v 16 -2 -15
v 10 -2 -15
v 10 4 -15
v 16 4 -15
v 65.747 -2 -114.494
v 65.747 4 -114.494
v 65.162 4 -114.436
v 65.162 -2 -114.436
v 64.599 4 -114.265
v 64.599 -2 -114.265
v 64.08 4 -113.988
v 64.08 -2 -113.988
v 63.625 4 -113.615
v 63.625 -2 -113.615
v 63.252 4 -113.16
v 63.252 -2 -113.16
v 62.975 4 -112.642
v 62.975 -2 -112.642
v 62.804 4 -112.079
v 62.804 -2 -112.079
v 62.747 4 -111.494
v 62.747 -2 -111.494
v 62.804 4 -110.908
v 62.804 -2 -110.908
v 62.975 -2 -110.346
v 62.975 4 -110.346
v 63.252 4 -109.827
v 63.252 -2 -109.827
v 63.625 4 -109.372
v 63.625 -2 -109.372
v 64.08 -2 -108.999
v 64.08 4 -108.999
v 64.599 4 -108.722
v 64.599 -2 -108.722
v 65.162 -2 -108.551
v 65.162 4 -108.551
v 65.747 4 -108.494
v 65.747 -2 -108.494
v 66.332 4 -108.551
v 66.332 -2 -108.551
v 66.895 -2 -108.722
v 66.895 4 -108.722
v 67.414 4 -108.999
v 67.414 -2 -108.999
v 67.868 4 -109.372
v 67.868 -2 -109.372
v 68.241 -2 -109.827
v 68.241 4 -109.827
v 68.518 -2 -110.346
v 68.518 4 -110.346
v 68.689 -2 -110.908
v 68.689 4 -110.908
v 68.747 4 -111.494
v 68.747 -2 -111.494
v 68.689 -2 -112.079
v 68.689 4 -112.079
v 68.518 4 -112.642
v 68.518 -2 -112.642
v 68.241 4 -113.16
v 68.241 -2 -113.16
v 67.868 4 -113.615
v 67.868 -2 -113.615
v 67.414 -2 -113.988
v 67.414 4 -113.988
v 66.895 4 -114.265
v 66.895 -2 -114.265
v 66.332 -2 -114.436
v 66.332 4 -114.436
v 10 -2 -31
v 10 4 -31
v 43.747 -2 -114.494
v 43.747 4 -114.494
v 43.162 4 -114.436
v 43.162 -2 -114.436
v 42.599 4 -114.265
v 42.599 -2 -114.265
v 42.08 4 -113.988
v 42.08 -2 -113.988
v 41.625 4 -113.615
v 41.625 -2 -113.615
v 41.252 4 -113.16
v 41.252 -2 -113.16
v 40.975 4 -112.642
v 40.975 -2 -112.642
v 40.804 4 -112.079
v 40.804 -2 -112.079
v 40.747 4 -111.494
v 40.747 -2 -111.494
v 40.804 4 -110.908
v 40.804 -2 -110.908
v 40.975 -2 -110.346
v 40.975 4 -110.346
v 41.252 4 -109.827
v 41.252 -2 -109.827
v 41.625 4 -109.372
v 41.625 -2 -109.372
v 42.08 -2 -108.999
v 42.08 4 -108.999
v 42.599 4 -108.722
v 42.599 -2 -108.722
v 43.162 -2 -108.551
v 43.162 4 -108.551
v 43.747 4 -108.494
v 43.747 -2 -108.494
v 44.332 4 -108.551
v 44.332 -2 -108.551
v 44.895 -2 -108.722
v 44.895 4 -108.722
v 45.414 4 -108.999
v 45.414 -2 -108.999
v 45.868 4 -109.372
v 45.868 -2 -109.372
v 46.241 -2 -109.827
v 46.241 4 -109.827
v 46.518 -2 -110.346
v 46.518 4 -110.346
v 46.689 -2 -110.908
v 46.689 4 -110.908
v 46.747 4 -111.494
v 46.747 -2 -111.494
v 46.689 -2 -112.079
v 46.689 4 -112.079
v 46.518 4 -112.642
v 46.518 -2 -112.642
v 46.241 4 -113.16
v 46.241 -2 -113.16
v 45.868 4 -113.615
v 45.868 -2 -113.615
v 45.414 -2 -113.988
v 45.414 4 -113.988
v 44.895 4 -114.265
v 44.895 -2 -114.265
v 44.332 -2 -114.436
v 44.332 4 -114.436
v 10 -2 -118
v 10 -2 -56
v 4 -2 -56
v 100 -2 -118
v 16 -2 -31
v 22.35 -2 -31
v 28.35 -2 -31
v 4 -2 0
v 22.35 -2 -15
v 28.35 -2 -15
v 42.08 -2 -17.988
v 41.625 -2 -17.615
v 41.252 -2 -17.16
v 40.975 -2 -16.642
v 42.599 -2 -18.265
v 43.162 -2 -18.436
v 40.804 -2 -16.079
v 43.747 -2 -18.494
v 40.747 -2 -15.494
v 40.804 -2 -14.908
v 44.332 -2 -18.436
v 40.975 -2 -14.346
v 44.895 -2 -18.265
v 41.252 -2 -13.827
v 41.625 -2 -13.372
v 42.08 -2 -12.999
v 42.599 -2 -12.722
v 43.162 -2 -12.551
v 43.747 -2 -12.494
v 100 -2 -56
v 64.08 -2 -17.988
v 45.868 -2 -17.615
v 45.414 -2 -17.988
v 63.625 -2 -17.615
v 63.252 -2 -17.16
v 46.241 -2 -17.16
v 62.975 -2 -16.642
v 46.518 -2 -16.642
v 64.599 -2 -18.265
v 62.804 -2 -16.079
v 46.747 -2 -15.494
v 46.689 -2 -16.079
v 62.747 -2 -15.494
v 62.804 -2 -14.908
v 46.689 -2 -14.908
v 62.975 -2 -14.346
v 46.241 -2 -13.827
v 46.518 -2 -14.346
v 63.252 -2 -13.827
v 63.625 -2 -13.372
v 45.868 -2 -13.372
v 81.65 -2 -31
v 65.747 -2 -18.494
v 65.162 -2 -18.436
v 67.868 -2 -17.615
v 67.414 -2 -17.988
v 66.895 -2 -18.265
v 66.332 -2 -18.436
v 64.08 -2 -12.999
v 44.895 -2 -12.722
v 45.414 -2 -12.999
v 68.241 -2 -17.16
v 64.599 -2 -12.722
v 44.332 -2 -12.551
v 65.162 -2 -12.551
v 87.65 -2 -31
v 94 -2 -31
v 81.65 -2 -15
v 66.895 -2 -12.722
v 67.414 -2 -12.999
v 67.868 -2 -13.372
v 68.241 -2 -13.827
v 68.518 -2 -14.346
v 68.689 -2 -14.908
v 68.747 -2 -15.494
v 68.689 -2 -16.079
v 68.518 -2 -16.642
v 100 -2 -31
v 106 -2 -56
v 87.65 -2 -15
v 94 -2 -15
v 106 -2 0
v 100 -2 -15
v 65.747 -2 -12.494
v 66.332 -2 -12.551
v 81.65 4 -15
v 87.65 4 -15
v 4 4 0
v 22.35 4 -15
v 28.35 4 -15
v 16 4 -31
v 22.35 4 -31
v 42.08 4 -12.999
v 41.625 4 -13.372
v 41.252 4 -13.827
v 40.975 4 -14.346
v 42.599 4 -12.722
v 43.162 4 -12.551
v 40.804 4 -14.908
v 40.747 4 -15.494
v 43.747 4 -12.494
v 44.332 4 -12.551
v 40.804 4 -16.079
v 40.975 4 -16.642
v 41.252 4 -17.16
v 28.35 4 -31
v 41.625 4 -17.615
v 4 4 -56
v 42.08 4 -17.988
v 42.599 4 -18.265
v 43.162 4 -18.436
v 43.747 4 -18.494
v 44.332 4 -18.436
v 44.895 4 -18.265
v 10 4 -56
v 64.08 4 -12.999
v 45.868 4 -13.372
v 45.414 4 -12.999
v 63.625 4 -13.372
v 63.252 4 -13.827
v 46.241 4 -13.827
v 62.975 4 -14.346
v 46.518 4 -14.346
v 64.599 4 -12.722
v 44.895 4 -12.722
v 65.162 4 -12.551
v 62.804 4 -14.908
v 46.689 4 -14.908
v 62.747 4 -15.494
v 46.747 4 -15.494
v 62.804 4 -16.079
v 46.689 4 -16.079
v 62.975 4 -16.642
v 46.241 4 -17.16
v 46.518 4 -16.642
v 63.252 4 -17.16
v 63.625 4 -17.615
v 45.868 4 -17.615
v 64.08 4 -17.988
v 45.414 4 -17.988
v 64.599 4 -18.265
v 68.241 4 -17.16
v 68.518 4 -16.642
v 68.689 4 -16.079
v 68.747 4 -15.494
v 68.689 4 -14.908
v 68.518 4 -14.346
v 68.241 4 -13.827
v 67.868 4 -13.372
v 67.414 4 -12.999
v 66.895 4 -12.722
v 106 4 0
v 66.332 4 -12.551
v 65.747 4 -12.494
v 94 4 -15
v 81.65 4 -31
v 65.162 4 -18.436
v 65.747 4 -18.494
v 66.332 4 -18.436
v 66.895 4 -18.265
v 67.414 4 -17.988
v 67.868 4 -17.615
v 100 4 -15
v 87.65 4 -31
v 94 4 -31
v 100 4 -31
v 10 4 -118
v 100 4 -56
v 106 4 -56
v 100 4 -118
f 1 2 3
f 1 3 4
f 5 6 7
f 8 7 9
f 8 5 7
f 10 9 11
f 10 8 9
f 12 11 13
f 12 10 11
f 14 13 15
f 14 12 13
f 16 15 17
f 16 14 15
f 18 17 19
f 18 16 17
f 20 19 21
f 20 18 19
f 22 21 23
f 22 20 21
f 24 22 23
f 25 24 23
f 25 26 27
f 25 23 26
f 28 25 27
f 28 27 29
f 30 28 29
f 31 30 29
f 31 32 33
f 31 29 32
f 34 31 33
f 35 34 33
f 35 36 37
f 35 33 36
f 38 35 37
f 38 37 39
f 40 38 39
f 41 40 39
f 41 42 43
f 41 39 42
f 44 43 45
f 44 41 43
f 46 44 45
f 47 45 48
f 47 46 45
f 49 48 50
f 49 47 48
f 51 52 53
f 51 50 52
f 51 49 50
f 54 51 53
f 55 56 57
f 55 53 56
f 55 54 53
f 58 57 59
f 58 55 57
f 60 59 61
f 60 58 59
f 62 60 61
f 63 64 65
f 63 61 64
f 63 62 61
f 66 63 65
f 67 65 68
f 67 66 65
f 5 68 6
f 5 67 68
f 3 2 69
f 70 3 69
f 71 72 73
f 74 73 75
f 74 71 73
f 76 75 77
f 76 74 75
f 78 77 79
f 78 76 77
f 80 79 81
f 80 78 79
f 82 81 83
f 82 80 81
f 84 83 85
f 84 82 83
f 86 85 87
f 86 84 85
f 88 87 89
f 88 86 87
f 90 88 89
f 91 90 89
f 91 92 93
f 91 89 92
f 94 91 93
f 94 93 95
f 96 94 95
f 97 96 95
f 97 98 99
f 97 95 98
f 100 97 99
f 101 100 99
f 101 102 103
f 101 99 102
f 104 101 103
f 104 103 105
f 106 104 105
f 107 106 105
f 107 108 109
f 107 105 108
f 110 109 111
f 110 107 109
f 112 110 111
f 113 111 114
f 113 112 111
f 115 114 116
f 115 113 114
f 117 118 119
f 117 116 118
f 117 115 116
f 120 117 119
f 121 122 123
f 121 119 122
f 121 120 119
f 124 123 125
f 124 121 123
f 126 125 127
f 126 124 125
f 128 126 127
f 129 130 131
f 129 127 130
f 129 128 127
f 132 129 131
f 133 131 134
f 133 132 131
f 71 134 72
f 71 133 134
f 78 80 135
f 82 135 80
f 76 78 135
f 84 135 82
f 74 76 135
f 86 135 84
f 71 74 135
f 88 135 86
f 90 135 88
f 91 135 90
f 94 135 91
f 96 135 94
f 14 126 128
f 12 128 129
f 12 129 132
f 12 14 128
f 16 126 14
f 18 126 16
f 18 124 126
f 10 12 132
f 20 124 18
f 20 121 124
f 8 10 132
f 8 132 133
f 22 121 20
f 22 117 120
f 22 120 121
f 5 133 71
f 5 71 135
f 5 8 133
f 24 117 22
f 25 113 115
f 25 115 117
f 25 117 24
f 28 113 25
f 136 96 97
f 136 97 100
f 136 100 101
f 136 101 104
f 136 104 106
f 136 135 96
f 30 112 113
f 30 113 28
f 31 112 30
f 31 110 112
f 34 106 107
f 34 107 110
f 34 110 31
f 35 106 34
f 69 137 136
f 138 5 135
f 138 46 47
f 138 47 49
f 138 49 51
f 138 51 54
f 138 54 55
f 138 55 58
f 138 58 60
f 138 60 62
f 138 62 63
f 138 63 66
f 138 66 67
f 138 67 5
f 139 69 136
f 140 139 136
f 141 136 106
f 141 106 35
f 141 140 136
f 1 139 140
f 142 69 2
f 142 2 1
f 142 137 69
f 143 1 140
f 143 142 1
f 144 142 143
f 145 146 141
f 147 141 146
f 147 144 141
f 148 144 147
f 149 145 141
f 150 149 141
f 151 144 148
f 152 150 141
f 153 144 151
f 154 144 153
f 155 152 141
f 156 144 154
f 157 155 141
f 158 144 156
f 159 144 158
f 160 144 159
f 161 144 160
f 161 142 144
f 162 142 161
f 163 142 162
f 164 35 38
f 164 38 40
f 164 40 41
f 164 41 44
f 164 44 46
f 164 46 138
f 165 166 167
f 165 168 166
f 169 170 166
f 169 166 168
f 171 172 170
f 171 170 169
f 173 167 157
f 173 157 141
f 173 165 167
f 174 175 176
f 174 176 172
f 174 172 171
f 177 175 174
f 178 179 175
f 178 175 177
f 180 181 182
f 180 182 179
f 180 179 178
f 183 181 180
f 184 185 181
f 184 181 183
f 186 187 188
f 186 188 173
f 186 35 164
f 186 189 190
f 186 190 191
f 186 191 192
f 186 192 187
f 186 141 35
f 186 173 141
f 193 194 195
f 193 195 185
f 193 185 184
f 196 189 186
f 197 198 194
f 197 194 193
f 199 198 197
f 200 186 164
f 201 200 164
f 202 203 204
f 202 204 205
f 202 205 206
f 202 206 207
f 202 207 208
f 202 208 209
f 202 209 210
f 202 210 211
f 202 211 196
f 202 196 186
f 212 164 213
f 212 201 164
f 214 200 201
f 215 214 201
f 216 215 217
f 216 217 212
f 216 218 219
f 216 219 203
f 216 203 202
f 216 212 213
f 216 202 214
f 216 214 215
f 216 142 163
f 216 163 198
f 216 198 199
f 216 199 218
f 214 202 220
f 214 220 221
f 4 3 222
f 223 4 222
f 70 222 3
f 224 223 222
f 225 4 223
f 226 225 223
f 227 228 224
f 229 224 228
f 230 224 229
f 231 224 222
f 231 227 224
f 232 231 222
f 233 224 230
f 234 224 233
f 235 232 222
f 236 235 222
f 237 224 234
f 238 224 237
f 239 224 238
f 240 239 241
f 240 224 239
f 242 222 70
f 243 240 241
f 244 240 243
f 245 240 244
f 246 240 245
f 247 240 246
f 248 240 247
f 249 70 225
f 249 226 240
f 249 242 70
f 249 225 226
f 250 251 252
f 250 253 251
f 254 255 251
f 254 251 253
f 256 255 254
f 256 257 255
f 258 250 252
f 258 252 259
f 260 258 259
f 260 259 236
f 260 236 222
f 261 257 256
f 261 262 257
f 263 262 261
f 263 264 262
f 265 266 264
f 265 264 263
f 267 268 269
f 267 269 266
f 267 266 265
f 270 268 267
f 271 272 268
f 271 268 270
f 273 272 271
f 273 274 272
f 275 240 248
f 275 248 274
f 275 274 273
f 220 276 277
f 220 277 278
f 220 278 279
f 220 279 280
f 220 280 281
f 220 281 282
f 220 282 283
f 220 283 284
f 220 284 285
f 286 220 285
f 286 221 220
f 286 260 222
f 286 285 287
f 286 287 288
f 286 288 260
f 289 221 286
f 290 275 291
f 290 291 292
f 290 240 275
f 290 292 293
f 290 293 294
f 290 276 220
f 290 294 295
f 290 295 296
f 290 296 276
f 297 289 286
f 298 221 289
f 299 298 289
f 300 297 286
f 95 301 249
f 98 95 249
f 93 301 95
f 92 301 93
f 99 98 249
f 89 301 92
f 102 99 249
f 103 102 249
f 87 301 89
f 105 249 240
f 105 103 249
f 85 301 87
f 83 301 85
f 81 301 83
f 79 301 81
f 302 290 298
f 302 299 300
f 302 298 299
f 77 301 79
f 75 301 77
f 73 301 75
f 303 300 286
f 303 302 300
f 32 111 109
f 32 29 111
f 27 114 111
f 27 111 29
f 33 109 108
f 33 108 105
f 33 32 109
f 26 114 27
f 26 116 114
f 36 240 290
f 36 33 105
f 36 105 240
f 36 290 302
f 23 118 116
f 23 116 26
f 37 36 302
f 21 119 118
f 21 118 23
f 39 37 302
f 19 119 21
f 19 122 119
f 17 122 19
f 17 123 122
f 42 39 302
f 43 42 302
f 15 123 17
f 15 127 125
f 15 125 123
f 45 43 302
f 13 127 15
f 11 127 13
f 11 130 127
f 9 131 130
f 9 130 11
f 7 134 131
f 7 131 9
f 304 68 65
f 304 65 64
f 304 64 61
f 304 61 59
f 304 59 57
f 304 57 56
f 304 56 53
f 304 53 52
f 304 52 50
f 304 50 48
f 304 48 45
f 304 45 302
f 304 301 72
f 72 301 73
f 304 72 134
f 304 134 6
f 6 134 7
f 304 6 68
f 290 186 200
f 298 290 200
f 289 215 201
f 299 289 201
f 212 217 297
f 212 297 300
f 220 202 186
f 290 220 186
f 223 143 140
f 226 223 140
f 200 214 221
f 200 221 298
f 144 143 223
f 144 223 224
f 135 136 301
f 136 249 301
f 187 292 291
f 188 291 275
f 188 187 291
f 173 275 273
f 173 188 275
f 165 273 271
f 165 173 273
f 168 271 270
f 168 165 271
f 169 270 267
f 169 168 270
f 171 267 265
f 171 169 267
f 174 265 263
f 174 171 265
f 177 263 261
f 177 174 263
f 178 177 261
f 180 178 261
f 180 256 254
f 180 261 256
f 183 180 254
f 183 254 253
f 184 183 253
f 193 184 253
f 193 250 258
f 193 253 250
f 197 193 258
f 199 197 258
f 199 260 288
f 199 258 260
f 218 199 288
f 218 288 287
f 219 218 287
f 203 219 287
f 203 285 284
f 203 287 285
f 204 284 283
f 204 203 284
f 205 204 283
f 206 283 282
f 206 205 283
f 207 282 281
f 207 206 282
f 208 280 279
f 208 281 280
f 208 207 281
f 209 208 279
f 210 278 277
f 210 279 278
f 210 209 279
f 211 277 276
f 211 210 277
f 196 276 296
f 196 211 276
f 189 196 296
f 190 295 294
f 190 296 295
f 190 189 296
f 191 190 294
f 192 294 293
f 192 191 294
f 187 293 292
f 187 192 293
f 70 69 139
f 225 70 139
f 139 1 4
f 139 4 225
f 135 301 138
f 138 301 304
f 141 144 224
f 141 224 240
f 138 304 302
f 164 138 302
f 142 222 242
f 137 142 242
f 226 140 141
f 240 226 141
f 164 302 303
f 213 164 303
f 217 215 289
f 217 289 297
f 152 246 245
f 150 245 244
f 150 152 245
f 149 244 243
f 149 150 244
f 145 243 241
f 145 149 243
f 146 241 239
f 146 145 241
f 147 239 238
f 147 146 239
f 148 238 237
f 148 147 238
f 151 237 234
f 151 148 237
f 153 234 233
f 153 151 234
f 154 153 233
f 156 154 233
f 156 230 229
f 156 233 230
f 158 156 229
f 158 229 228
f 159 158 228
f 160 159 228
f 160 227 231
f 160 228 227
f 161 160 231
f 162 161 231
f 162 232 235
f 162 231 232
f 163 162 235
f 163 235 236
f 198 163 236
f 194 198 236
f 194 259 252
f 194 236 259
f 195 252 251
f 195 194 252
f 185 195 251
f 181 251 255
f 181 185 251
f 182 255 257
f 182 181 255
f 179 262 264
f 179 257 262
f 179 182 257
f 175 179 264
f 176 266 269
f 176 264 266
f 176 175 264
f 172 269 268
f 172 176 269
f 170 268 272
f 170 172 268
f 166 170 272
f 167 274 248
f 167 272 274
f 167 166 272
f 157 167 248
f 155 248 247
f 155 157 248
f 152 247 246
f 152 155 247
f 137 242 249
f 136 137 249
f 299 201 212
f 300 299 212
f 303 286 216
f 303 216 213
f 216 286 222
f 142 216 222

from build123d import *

# Parameters (mm, degrees)
SKETCH2_W           = 110
SKETCH2_H           = 118
BOSS_EXTRUDE1_DEPTH = 4
SKETCH3_W           = 10
SKETCH3_H           = 62
BOSS_EXTRUDE2_DEPTH = 16
CUT_EXTRUDE8_DEPTH  = 163.55460621
SKETCH12_W          = 6
SKETCH12_H          = 16
BOSS_EXTRUDE3_DEPTH = 16
SKETCH14_R          = 4
CUT_EXTRUDE9_DEPTH  = 156.961533719
CUT_EXTRUDE10_DEPTH = 3.5
SKETCH24_R          = 3
CUT_EXTRUDE15_DEPTH = 8
SPLIT2_OUTLINE_W    = 16
SPLIT2_OUTLINE_H    = 62
SPLIT2_DEPTH        = 110
SPLIT3_START        = 10
SPLIT3_OUTLINE_W    = 16
SPLIT3_OUTLINE_H    = 16
SPLIT3_OUTLINE_R    = 4
SPLIT3_DEPTH        = 90
SKETCH25_W          = 10
SKETCH25_H          = 62
SKETCH25_W_2        = 6
SKETCH25_H_2        = 16
CUT_EXTRUDE16_DEPTH = 10
SKETCH27_R          = 3.395097118
SKETCH27_R_2        = 3.39905673
BOSS_EXTRUDE4_DEPTH = 4
BOSS_EXTRUDE5_DEPTH = 2
CUT_EXTRUDE18_START = -6
SKETCH29_R          = 3
SKETCH29_W          = 6
SKETCH29_H          = 16
CUT_EXTRUDE18_DEPTH = 6
SKETCH30_W          = 4
SKETCH30_H          = 56
CUT_EXTRUDE19_DEPTH = 10


# Read off the part's stored shape, not the designer's step: Split2, Split3
with BuildPart() as part:
    # Sketch2 → Boss-Extrude1 (new body)
    with BuildSketch(Plane(origin=(0, 0, 0), x_dir=(1, 0, 0), z_dir=(0, 1, 0))):
        with Locations((55, 59)):
            Rectangle(SKETCH2_W, SKETCH2_H)
    extrude(amount=BOSS_EXTRUDE1_DEPTH)

    # Sketch3 → Boss-Extrude2 (add)
    with BuildSketch(Plane(origin=(0, 4, 0), x_dir=(1, 0, 0), z_dir=(0, 1, 0))):
        with Locations((5, 87)):
            Rectangle(SKETCH3_W, SKETCH3_H)
        with Locations((105, 87)):
            Rectangle(SKETCH3_W, SKETCH3_H)
    extrude(amount=BOSS_EXTRUDE2_DEPTH)

    # Sketch11 → Cut-Extrude8 (cut, through all)
    with BuildSketch(Plane.ZY):
        with BuildLine():
            Line((-111, 17.105440781), (-63, 17.105440781))
            ThreePointArc((-63, 17.105440781), (-59, 13.105440781), (-63, 9.105440781))
            Line((-63, 9.105440781), (-111, 9.105440781))
            ThreePointArc((-111, 9.105440781), (-115, 13.105440781), (-111, 17.105440781))
        make_face()
    extrude(amount=-CUT_EXTRUDE8_DEPTH, mode=Mode.SUBTRACT)

    # Sketch12 → Boss-Extrude3 (add)
    with BuildSketch(Plane(origin=(0, 4, 0), x_dir=(1, 0, 0), z_dir=(0, 1, 0))):
        with Locations((13, 23)):
            Rectangle(SKETCH12_W, SKETCH12_H)
        with Locations((97, 23)):
            Rectangle(SKETCH12_W, SKETCH12_H)
        with Locations((84.65, 23)):
            Rectangle(SKETCH12_W, SKETCH12_H)
        with Locations((25.35, 23)):
            Rectangle(SKETCH12_W, SKETCH12_H)
    extrude(amount=BOSS_EXTRUDE3_DEPTH)

    # Sketch14 → Cut-Extrude9 (cut, through all)
    with BuildSketch(Plane.ZY.offset(-10)):
        with Locations((-23, 14)):
            Circle(SKETCH14_R)
    extrude(amount=-CUT_EXTRUDE9_DEPTH, mode=Mode.SUBTRACT)

    # Sketch16 → Cut-Extrude10 (cut)
    with BuildSketch(Plane(origin=(10, 0, 0), x_dir=(0, 0, -1), z_dir=(1, 0, 0))):
        Polygon((74.219115806, 19.439463765), (74.219115806, 18.227285811), (62.862799814, 18.227285811), (62.862799814, 19.672541564), (62.862799814, 20.227285811), (74.219115806, 20.227285811), align=None)
    cut_extrude10 = extrude(amount=-CUT_EXTRUDE10_DEPTH, mode=Mode.SUBTRACT)

    # Mirror1: Cut-Extrude10 across plane
    add(cut_extrude10.mirror(Plane(origin=(55, 0, 0), x_dir=(0, 0, 1), z_dir=(1, 0, 0))), mode=Mode.SUBTRACT)

    # Sketch24 → Cut-Extrude15 (cut)
    with BuildSketch(Plane.XZ):
        with Locations(Location((65.746814509, -111.493629018, 0), (0, 0, 270))):
            Circle(SKETCH24_R)
        with Locations(Location((43.746814509, -111.493629018, 0), (0, 0, 270))):
            Circle(SKETCH24_R)
        with Locations(Location((65.746814509, -15.493629018, 0), (0, 0, 270))):
            Circle(SKETCH24_R)
        with Locations(Location((43.746814509, -15.493629018, 0), (0, 0, 270))):
            Circle(SKETCH24_R)
        with Locations(Location((102.746814509, -52.493629018, 0), (0, 0, 270))):
            Circle(SKETCH24_R)
        with Locations(Location((6.746814509, -52.493629018, 0), (0, 0, 270))):
            Circle(SKETCH24_R)
    extrude(amount=-CUT_EXTRUDE15_DEPTH, mode=Mode.SUBTRACT)

    # Split2 outline → Split2 (cut)
    with BuildSketch(Plane.YZ):
        with Locations((12, -87)):
            Rectangle(SPLIT2_OUTLINE_W, SPLIT2_OUTLINE_H)
        with BuildLine():
            Line((9.105440781, -111), (9.105440781, -63))
            ThreePointArc((9.105440781, -63), (13.105440781, -59), (17.105440781, -63))
            Line((17.105440781, -63), (17.105440781, -111))
            ThreePointArc((17.105440781, -111), (13.105440781, -115), (9.105440781, -111))
        make_face(mode=Mode.SUBTRACT)
    extrude(amount=SPLIT2_DEPTH, mode=Mode.SUBTRACT)

    # Split3 outline → Split3 (cut)
    with BuildSketch(Plane.YZ.offset(SPLIT3_START)):
        with Locations((12, -23)):
            Rectangle(SPLIT3_OUTLINE_W, SPLIT3_OUTLINE_H)
        with Locations((14, -23)):
            Circle(SPLIT3_OUTLINE_R, mode=Mode.SUBTRACT)
    extrude(amount=SPLIT3_DEPTH, mode=Mode.SUBTRACT)

    # Sketch25 → Cut-Extrude16 (cut)
    with BuildSketch(Plane(origin=(0, 4, 0), x_dir=(1, 0, 0), z_dir=(0, 1, 0))):
        with Locations((5, 87)):
            Rectangle(SKETCH25_W, SKETCH25_H)
        with Locations((13, 23)):
            Rectangle(SKETCH25_W_2, SKETCH25_H_2)
        with Locations((25.35, 23)):
            Rectangle(SKETCH25_W_2, SKETCH25_H_2)
        with Locations((84.65, 23)):
            Rectangle(SKETCH25_W_2, SKETCH25_H_2)
        with Locations((97, 23)):
            Rectangle(SKETCH25_W_2, SKETCH25_H_2)
        with Locations((105, 87)):
            Rectangle(SKETCH25_W, SKETCH25_H)
    extrude(amount=-CUT_EXTRUDE16_DEPTH, mode=Mode.SUBTRACT)

    # Sketch27 → Boss-Extrude4 (add)
    with BuildSketch(Plane(origin=(0, 4, 0), x_dir=(1, 0, 0), z_dir=(0, 1, 0))):
        with Locations((6.746814509, 52.493629018)):
            Circle(SKETCH27_R)
        with Locations((102.746814509, 52.493629018)):
            Circle(SKETCH27_R_2)
    extrude(amount=-BOSS_EXTRUDE4_DEPTH)

    # Sketch28 → Boss-Extrude5 (add)
    with BuildSketch(Plane.XZ):
        Polygon((100, -56), (110, -56), (110, 0), (0, 0), (0, -56), (10, -56), (10, -118), (100, -118), align=None)
    extrude(amount=BOSS_EXTRUDE5_DEPTH)

    # Sketch29 → Cut-Extrude18 (cut)
    with BuildSketch(Plane(origin=(0, 4, 0), x_dir=(1, 0, 0), z_dir=(0, 1, 0)).offset(CUT_EXTRUDE18_START)):
        with Locations(Location((43.746814509, 111.493629018, 0), (0, 0, 90))):
            Circle(SKETCH29_R)
        with Locations(Location((65.746814509, 111.493629018, 0), (0, 0, 90))):
            Circle(SKETCH29_R)
        with Locations(Location((43.746814509, 15.493629018, 0), (0, 0, 90))):
            Circle(SKETCH29_R)
        with Locations(Location((65.746814509, 15.493629018, 0), (0, 0, 90))):
            Circle(SKETCH29_R)
        with Locations((25.35, 23)):
            Rectangle(SKETCH29_W, SKETCH29_H)
        with Locations((13, 23)):
            Rectangle(SKETCH29_W, SKETCH29_H)
        with Locations((84.65, 23)):
            Rectangle(SKETCH29_W, SKETCH29_H)
        with Locations((97, 23)):
            Rectangle(SKETCH29_W, SKETCH29_H)
    extrude(amount=CUT_EXTRUDE18_DEPTH, mode=Mode.SUBTRACT)

    # Sketch30 → Cut-Extrude19 (cut)
    with BuildSketch(Plane(origin=(0, 4, 0), x_dir=(1, 0, 0), z_dir=(0, 1, 0))):
        with Locations((2, 28)):
            Rectangle(SKETCH30_W, SKETCH30_H)
        with Locations((108, 28)):
            Rectangle(SKETCH30_W, SKETCH30_H)
    extrude(amount=-CUT_EXTRUDE19_DEPTH, mode=Mode.SUBTRACT)


solid = part.part
